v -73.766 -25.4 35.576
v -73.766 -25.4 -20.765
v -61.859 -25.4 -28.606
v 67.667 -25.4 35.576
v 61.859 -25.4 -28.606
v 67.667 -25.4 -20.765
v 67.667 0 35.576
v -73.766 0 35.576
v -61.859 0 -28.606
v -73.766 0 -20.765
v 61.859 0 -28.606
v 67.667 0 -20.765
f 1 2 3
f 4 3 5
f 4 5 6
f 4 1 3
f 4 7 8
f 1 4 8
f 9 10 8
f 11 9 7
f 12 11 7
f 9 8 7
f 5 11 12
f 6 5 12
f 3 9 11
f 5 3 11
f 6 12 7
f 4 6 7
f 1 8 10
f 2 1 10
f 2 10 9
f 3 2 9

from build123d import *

# Parameters (mm, degrees)
F0_W     = 123.7178146839
F0_H     = 7.841270417
F0_H_2   = 49.3709631264
F1_DEPTH = 25.4


with BuildPart() as f1:
    # F0 (on Front) → F1 (new body)
    with BuildSketch(Plane.XZ):
        Polygon((67.6672682166, 35.5761349201), (61.858907342, 28.6061167717), (61.858907342, -20.7648463547), (67.6672682166, -20.7648463547), align=None)
        Polygon((-61.858907342, 28.6061167717), (61.858907342, 28.6061167717), (67.6672682166, 35.5761349201), (-73.7660303712, 35.5761349201), align=None)
        Polygon((-61.858907342, -20.7648463547), (-61.858907342, 28.6061167717), (-73.7660303712, 35.5761349201), (-73.7660303712, -20.7648463547), align=None)
        Polygon((67.6672682166, -20.7648463547), (61.858907342, -20.7648463547), (61.858907342, -28.6061167717), align=None)
        with Locations((0, -24.6854815632)):
            Rectangle(F0_W, F0_H)
        Polygon((-61.858907342, -28.6061167717), (-61.858907342, -20.7648463547), (-73.7660303712, -20.7648463547), align=None)
        with Locations((0, 3.9206352085)):
            Rectangle(F0_W, F0_H_2)
    extrude(amount=F1_DEPTH)


solid = f1.part
